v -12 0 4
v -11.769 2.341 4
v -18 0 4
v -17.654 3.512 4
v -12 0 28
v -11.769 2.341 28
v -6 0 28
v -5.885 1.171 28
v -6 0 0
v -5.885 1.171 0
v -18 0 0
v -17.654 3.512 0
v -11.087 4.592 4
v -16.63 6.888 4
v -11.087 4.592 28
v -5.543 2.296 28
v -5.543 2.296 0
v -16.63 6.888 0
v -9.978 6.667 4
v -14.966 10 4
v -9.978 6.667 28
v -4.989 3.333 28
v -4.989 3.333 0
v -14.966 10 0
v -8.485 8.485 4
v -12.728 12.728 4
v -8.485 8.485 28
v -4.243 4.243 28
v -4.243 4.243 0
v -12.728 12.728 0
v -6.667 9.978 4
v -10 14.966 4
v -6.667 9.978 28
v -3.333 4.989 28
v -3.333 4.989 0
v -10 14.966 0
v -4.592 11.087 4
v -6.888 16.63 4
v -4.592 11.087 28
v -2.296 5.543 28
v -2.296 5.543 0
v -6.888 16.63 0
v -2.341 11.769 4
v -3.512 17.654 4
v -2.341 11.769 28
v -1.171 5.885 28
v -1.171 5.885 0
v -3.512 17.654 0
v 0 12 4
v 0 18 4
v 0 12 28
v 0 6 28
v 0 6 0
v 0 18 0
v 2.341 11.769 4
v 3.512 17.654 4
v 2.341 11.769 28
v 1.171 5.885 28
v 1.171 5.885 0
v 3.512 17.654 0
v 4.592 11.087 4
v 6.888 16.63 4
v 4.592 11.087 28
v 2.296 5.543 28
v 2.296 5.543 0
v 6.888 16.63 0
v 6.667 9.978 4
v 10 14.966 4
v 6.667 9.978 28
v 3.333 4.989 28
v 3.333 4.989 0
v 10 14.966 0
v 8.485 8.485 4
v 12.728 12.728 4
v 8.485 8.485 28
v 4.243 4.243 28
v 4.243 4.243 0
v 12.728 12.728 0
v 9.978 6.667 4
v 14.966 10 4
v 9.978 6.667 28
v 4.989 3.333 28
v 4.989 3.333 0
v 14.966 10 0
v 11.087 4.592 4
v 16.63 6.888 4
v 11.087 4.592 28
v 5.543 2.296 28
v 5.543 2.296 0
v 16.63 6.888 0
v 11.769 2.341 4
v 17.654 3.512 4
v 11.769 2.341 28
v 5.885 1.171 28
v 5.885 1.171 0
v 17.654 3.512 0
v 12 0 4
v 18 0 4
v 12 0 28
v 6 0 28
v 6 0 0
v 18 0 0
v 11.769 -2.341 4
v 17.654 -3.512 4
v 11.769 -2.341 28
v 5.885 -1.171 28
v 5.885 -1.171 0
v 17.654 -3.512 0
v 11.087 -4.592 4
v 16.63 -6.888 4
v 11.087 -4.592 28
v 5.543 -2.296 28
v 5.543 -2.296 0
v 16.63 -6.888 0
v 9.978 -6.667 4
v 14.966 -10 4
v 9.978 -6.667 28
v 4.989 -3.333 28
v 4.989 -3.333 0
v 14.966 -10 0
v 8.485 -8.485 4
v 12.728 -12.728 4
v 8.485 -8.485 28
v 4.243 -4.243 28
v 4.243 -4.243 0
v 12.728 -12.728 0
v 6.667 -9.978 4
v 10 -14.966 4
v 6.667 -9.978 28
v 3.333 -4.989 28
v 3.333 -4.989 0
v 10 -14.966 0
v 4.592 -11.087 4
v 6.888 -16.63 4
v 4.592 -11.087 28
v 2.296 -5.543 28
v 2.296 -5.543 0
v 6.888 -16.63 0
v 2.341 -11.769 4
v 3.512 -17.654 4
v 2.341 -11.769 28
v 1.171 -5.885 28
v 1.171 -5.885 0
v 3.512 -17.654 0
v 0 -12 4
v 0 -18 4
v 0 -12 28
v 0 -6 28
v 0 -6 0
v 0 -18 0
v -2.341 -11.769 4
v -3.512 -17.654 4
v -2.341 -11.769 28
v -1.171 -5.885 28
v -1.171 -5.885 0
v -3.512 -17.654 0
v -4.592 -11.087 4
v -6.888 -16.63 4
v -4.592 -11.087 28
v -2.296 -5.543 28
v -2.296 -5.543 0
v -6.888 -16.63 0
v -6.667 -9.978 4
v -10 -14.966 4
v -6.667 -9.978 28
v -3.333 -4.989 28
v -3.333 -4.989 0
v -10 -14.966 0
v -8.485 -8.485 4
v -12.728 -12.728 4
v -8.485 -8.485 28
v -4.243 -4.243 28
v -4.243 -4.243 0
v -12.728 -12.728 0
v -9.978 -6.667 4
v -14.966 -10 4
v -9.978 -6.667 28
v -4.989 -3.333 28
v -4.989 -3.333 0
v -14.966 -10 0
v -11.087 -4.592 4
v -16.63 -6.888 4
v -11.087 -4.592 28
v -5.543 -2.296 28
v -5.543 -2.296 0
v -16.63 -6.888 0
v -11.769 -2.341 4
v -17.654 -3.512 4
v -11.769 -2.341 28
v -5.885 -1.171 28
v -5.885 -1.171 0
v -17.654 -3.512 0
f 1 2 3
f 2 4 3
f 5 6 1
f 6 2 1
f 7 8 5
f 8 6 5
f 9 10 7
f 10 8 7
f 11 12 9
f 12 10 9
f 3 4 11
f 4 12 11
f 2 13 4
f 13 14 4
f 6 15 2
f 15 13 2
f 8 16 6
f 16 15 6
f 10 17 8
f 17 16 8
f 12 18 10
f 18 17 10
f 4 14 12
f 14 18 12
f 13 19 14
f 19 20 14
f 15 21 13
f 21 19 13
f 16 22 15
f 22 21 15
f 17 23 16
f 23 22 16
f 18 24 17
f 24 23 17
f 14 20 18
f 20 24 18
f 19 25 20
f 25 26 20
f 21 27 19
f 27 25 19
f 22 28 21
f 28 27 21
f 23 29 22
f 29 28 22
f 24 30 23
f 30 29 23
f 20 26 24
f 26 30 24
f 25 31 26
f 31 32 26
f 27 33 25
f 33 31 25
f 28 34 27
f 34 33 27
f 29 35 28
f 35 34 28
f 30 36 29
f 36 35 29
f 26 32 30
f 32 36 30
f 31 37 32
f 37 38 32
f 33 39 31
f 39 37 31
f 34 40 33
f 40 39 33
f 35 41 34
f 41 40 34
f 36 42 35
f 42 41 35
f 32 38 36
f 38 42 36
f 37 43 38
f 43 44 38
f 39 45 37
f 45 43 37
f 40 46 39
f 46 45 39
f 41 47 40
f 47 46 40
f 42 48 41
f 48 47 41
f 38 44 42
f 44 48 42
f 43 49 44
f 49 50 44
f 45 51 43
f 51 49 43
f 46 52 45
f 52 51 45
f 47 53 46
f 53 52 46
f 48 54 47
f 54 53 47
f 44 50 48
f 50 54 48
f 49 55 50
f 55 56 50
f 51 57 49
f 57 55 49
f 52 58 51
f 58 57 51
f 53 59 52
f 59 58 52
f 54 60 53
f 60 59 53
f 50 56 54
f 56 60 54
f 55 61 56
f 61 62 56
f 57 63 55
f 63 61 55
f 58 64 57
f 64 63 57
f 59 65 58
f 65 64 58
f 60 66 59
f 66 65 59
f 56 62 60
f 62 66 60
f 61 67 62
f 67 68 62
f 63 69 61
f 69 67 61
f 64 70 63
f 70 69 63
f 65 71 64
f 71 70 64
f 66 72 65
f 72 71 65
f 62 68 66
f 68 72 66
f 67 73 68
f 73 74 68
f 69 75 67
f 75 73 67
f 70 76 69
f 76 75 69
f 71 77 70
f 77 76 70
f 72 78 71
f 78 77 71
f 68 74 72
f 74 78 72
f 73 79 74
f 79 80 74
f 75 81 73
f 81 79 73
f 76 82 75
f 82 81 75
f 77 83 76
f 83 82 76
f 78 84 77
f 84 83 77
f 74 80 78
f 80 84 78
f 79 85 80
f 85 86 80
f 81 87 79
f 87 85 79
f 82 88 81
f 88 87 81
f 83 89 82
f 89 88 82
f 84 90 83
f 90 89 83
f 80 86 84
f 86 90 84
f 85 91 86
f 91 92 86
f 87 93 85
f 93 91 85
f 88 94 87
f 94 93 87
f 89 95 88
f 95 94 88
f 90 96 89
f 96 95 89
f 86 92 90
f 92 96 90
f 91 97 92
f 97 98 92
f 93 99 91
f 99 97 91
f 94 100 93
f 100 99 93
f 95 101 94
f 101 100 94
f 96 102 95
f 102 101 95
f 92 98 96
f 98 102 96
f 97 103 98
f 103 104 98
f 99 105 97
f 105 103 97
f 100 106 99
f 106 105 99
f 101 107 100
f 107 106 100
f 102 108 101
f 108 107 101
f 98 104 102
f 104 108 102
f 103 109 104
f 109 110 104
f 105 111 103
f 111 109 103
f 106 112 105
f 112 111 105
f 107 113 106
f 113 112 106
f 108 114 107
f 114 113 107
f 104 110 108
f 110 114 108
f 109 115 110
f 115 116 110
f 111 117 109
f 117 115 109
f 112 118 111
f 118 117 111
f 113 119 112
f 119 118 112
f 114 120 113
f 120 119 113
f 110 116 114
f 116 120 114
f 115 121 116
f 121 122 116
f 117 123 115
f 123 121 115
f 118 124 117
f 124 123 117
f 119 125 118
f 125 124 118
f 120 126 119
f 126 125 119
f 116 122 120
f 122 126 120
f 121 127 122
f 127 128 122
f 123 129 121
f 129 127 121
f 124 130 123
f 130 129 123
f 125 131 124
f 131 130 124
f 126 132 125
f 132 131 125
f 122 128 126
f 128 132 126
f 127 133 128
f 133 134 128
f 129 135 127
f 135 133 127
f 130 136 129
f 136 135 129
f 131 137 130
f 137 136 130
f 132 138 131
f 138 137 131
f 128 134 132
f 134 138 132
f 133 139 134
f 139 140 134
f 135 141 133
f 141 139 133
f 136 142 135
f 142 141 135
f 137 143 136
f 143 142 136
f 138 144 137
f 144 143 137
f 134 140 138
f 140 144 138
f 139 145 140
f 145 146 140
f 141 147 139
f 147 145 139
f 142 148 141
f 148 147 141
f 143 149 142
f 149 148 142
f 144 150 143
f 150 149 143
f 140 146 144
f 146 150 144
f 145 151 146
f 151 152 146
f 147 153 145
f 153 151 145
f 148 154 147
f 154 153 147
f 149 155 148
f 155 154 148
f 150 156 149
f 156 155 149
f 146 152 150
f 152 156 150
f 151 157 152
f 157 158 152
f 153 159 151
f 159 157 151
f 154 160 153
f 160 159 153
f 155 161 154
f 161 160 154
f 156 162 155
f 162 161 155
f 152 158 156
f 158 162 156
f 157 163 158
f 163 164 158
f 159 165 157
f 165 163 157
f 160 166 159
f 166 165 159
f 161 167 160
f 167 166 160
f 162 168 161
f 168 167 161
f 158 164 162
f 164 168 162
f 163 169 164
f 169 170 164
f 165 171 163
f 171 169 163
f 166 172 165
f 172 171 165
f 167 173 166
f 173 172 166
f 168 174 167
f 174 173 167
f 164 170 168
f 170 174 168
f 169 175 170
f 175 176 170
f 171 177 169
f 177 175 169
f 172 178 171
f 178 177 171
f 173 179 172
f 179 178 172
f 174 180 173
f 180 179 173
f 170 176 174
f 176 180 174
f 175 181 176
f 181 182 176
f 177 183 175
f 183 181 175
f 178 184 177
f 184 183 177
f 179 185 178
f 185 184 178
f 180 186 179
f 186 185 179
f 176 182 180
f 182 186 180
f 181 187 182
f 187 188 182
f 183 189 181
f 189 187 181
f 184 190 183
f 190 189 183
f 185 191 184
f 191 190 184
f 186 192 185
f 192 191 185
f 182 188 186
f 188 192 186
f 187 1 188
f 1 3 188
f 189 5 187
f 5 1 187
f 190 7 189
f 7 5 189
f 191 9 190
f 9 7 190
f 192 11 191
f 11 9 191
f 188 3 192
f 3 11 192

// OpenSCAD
$fn = 32;

// ----------------------------------------------------------------------
// Revolved part: flanged bushing R18
// ----------------------------------------------------------------------

// --- parameters (mm) ---
bore_r = 6;               // bore radius
flange_r = 18;            // flange radius
flange_h = 4;             // flange thickness
sleeve_r = 12;            // sleeve radius
total_h = 28;             // overall height
revolve_angle = 360;      // revolve sweep, degrees

bore_d = 2 * bore_r;
flange_d = 2 * flange_r;
sleeve_d = 2 * sleeve_r;

profile = [[6, 0], [18, 0], [18, 4], [12, 4], [12, 28], [6, 28]];  // primary outline, 6 points, counter clockwise

// --- the one profile operation ---
rotate_extrude(angle = revolve_angle) polygon(points = profile);
